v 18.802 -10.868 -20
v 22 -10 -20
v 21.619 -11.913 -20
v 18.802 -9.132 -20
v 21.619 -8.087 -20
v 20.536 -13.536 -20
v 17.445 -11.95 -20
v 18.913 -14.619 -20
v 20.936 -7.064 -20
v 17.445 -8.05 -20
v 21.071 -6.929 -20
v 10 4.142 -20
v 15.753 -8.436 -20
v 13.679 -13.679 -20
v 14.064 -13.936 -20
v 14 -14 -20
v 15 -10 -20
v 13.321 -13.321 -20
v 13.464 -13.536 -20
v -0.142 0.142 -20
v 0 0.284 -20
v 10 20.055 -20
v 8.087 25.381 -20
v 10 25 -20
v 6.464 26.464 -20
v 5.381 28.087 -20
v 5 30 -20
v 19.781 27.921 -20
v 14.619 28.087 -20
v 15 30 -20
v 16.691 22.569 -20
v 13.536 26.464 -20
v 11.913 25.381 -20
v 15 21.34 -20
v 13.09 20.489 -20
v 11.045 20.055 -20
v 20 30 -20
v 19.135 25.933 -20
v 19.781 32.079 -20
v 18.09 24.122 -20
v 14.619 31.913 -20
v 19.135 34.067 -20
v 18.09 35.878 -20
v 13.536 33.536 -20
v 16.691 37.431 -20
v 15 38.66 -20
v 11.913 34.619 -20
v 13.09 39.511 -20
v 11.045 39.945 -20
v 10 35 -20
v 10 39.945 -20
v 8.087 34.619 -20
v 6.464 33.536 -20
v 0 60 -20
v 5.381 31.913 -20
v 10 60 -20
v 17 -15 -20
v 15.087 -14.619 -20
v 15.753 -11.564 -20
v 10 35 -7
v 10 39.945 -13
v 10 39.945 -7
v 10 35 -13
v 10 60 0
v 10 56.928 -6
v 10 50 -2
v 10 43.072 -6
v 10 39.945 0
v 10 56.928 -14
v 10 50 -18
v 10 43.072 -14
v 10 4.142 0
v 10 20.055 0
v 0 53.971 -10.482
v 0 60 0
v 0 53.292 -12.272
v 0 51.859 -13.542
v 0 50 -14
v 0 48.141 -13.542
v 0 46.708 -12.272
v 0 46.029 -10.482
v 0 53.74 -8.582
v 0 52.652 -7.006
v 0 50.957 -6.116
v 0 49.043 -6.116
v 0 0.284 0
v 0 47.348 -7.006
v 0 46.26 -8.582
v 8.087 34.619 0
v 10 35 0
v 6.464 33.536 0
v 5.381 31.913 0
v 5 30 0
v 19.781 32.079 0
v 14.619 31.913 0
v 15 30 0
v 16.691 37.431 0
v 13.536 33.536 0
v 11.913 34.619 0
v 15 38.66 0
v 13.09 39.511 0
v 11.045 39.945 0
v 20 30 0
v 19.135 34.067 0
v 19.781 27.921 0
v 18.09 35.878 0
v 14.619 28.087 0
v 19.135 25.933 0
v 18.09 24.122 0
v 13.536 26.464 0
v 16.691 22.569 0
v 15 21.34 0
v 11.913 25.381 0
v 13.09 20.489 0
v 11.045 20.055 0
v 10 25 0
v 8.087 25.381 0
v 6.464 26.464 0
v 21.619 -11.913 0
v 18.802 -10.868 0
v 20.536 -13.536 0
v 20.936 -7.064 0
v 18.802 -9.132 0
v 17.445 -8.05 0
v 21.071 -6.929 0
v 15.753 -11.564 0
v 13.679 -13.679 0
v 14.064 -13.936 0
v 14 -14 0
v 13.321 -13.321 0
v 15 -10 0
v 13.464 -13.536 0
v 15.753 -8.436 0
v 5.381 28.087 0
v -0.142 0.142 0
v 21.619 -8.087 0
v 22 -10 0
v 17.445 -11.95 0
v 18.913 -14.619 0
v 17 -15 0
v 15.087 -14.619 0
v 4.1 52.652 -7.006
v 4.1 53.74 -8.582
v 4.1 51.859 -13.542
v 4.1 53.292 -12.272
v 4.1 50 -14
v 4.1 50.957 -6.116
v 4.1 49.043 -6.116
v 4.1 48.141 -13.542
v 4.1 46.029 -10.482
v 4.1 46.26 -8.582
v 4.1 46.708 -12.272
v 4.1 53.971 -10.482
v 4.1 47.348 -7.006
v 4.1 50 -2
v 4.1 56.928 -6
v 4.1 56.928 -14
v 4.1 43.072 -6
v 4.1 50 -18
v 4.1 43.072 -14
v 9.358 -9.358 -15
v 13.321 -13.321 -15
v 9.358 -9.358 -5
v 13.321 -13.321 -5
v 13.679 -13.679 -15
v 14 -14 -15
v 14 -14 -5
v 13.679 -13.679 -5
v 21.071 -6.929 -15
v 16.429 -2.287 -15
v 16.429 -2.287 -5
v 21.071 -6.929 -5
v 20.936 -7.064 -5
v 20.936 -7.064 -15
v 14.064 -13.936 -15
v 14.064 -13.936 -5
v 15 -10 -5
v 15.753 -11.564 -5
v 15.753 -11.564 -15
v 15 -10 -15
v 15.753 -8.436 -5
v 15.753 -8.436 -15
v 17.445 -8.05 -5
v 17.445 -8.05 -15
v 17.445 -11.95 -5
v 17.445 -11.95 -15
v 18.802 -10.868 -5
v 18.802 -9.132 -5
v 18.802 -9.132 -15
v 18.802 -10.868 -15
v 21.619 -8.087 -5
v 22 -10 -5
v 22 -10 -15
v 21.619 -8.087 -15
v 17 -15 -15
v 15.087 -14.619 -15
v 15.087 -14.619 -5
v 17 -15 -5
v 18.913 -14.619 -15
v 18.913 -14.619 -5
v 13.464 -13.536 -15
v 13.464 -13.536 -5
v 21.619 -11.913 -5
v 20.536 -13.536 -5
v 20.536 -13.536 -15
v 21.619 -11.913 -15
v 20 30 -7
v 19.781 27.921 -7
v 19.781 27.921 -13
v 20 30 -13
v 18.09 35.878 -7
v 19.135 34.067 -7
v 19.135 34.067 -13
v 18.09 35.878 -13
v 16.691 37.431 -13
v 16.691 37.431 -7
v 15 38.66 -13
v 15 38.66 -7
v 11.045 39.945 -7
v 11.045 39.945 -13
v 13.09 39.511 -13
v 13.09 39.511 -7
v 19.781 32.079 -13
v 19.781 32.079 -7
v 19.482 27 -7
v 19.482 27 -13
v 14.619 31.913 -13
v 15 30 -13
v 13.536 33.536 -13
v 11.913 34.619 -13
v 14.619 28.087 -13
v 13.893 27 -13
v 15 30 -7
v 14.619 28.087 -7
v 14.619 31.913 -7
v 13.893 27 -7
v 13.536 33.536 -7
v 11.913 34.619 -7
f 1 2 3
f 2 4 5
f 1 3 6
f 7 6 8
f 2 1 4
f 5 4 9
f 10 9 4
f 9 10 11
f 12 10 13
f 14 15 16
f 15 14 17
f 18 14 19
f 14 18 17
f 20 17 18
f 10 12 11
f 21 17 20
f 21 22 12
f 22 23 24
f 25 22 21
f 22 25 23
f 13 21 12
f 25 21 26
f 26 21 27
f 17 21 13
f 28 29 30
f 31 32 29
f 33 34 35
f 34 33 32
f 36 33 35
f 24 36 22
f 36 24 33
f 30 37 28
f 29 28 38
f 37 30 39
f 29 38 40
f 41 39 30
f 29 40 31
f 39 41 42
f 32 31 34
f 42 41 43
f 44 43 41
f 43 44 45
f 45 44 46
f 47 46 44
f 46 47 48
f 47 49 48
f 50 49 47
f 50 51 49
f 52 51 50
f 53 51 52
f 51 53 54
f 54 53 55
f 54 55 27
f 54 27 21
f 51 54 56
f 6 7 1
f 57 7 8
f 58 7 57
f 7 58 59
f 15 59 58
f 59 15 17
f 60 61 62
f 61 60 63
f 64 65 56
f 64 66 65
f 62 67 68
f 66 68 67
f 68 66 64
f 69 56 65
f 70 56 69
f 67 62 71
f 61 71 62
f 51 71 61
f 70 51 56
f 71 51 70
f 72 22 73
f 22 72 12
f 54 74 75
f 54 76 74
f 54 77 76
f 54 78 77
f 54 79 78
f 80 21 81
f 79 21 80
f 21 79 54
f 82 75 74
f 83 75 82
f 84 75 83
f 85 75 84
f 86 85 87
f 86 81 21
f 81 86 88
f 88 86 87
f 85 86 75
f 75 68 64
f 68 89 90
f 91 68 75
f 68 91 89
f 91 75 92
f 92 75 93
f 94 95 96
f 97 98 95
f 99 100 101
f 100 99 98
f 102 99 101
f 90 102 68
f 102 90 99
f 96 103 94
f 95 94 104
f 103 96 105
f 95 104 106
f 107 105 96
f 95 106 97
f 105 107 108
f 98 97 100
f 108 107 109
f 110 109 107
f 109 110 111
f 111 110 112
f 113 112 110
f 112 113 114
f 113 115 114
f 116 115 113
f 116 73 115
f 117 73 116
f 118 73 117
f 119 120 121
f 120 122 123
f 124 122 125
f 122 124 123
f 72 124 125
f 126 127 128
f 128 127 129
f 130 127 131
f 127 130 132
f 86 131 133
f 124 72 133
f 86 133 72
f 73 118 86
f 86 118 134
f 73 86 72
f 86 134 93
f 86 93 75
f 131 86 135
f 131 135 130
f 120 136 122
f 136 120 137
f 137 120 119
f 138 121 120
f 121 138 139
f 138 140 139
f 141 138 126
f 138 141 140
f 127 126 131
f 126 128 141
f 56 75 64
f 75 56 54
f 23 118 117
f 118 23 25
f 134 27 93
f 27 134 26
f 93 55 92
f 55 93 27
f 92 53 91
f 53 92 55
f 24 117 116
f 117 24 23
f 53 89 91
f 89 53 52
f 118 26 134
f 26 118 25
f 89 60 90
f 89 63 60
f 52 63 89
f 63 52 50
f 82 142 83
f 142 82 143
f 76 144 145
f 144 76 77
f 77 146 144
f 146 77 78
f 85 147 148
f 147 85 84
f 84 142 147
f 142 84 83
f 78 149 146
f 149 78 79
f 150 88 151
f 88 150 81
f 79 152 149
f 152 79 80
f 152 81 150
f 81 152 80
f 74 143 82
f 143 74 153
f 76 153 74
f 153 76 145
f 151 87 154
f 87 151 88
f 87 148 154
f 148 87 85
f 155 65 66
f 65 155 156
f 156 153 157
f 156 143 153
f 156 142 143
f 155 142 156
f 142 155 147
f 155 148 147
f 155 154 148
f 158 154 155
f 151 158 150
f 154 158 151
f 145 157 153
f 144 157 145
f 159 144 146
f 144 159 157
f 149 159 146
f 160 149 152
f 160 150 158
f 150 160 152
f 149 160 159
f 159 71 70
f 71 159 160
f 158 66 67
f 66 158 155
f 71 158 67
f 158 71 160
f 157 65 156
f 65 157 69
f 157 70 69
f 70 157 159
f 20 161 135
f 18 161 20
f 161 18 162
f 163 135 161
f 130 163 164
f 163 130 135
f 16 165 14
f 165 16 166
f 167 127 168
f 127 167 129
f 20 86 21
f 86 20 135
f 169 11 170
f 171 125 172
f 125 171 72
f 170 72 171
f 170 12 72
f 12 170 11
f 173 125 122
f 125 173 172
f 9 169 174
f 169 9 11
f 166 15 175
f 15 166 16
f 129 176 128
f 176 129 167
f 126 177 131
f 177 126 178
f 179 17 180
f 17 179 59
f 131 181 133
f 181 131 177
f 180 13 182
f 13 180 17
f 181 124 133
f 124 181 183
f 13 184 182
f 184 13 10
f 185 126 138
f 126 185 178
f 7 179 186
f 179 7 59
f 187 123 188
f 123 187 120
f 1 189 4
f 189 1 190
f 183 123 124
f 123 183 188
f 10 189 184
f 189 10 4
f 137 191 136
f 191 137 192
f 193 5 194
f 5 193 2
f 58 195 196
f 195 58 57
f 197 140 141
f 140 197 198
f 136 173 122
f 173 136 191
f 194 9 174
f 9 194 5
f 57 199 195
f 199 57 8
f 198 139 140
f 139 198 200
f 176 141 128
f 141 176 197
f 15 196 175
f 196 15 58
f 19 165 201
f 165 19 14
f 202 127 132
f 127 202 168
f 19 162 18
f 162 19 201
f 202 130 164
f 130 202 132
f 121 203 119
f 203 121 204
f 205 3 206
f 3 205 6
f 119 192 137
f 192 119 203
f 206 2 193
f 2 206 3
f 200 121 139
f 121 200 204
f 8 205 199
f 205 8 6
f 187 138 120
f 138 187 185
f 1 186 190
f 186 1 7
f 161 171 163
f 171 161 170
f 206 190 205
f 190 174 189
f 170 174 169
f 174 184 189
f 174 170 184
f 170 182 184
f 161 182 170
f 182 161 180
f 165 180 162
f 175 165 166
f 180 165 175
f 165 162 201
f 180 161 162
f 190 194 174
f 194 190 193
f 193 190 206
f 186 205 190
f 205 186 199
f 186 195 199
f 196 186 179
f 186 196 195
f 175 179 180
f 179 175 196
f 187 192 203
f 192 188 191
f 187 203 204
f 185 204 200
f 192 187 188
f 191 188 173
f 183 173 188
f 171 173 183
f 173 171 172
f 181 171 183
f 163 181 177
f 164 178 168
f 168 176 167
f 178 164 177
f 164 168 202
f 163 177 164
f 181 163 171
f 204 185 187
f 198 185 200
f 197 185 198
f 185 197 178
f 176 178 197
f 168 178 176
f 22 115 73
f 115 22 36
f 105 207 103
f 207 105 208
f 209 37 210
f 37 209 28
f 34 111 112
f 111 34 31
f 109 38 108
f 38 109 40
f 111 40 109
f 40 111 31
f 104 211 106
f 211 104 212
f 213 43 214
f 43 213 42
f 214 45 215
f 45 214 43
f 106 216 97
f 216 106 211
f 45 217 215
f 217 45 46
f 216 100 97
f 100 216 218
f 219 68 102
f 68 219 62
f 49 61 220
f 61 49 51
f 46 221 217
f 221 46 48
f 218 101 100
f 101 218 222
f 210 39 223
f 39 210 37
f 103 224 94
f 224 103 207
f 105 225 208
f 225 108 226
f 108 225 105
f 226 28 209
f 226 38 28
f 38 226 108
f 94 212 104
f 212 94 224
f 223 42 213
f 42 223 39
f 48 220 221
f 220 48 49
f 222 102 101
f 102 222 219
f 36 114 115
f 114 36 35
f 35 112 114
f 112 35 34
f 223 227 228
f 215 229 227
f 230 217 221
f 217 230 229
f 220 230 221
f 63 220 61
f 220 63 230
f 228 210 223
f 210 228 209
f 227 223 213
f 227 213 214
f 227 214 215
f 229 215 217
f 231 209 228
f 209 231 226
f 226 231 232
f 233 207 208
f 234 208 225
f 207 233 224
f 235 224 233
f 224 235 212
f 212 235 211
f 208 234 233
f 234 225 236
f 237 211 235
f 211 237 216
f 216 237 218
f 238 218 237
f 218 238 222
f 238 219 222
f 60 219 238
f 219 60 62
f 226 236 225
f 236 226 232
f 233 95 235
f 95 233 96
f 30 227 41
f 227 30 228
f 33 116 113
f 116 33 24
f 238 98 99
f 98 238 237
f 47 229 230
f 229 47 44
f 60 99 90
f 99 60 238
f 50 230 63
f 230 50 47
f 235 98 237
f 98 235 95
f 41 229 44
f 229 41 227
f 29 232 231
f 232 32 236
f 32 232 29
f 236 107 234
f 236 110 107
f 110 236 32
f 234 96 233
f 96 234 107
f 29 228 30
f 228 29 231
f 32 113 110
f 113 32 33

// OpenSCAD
use <MCAD/regular_shapes.scad>

module base()
{
difference()
{
cube([20,60,10]);
translate([-1,30,10])rotate([0,90,0]) cylinder(22,5,5);
translate([10,50,-0.5]) cylinder(11,4,4);
translate([10,50,4.1])hexagon_prism(6,8);
}
	module A()
	{
		union()
		{
		difference()
		{
		translate([0,-14,14])rotate([-45,0,0])cube([20,20,10]);
		translate([-1,-10,17])rotate([0,90,0])cylinder(22,2,2);
			}
			difference()
			{
			translate([0,-10,17])rotate([0,90,0])cylinder(20,5,5);
			translate([-1,-10,17])rotate([0,90,0])cylinder(22,2,2);
			}
		}
	}

difference()
{
A();
translate([5,-25,22])rotate([-45,0,0])cube([10,20,15]);
}
	difference()
	{
	translate([0,30,10])rotate([0,90,0]) cylinder(20,10,10);
	translate([7,27,10])cube([6,13,12]);
	translate([-1,30,10])rotate([0,90,0]) cylinder(22,5,5);
	}
}
rotate([0,90,00])base();
